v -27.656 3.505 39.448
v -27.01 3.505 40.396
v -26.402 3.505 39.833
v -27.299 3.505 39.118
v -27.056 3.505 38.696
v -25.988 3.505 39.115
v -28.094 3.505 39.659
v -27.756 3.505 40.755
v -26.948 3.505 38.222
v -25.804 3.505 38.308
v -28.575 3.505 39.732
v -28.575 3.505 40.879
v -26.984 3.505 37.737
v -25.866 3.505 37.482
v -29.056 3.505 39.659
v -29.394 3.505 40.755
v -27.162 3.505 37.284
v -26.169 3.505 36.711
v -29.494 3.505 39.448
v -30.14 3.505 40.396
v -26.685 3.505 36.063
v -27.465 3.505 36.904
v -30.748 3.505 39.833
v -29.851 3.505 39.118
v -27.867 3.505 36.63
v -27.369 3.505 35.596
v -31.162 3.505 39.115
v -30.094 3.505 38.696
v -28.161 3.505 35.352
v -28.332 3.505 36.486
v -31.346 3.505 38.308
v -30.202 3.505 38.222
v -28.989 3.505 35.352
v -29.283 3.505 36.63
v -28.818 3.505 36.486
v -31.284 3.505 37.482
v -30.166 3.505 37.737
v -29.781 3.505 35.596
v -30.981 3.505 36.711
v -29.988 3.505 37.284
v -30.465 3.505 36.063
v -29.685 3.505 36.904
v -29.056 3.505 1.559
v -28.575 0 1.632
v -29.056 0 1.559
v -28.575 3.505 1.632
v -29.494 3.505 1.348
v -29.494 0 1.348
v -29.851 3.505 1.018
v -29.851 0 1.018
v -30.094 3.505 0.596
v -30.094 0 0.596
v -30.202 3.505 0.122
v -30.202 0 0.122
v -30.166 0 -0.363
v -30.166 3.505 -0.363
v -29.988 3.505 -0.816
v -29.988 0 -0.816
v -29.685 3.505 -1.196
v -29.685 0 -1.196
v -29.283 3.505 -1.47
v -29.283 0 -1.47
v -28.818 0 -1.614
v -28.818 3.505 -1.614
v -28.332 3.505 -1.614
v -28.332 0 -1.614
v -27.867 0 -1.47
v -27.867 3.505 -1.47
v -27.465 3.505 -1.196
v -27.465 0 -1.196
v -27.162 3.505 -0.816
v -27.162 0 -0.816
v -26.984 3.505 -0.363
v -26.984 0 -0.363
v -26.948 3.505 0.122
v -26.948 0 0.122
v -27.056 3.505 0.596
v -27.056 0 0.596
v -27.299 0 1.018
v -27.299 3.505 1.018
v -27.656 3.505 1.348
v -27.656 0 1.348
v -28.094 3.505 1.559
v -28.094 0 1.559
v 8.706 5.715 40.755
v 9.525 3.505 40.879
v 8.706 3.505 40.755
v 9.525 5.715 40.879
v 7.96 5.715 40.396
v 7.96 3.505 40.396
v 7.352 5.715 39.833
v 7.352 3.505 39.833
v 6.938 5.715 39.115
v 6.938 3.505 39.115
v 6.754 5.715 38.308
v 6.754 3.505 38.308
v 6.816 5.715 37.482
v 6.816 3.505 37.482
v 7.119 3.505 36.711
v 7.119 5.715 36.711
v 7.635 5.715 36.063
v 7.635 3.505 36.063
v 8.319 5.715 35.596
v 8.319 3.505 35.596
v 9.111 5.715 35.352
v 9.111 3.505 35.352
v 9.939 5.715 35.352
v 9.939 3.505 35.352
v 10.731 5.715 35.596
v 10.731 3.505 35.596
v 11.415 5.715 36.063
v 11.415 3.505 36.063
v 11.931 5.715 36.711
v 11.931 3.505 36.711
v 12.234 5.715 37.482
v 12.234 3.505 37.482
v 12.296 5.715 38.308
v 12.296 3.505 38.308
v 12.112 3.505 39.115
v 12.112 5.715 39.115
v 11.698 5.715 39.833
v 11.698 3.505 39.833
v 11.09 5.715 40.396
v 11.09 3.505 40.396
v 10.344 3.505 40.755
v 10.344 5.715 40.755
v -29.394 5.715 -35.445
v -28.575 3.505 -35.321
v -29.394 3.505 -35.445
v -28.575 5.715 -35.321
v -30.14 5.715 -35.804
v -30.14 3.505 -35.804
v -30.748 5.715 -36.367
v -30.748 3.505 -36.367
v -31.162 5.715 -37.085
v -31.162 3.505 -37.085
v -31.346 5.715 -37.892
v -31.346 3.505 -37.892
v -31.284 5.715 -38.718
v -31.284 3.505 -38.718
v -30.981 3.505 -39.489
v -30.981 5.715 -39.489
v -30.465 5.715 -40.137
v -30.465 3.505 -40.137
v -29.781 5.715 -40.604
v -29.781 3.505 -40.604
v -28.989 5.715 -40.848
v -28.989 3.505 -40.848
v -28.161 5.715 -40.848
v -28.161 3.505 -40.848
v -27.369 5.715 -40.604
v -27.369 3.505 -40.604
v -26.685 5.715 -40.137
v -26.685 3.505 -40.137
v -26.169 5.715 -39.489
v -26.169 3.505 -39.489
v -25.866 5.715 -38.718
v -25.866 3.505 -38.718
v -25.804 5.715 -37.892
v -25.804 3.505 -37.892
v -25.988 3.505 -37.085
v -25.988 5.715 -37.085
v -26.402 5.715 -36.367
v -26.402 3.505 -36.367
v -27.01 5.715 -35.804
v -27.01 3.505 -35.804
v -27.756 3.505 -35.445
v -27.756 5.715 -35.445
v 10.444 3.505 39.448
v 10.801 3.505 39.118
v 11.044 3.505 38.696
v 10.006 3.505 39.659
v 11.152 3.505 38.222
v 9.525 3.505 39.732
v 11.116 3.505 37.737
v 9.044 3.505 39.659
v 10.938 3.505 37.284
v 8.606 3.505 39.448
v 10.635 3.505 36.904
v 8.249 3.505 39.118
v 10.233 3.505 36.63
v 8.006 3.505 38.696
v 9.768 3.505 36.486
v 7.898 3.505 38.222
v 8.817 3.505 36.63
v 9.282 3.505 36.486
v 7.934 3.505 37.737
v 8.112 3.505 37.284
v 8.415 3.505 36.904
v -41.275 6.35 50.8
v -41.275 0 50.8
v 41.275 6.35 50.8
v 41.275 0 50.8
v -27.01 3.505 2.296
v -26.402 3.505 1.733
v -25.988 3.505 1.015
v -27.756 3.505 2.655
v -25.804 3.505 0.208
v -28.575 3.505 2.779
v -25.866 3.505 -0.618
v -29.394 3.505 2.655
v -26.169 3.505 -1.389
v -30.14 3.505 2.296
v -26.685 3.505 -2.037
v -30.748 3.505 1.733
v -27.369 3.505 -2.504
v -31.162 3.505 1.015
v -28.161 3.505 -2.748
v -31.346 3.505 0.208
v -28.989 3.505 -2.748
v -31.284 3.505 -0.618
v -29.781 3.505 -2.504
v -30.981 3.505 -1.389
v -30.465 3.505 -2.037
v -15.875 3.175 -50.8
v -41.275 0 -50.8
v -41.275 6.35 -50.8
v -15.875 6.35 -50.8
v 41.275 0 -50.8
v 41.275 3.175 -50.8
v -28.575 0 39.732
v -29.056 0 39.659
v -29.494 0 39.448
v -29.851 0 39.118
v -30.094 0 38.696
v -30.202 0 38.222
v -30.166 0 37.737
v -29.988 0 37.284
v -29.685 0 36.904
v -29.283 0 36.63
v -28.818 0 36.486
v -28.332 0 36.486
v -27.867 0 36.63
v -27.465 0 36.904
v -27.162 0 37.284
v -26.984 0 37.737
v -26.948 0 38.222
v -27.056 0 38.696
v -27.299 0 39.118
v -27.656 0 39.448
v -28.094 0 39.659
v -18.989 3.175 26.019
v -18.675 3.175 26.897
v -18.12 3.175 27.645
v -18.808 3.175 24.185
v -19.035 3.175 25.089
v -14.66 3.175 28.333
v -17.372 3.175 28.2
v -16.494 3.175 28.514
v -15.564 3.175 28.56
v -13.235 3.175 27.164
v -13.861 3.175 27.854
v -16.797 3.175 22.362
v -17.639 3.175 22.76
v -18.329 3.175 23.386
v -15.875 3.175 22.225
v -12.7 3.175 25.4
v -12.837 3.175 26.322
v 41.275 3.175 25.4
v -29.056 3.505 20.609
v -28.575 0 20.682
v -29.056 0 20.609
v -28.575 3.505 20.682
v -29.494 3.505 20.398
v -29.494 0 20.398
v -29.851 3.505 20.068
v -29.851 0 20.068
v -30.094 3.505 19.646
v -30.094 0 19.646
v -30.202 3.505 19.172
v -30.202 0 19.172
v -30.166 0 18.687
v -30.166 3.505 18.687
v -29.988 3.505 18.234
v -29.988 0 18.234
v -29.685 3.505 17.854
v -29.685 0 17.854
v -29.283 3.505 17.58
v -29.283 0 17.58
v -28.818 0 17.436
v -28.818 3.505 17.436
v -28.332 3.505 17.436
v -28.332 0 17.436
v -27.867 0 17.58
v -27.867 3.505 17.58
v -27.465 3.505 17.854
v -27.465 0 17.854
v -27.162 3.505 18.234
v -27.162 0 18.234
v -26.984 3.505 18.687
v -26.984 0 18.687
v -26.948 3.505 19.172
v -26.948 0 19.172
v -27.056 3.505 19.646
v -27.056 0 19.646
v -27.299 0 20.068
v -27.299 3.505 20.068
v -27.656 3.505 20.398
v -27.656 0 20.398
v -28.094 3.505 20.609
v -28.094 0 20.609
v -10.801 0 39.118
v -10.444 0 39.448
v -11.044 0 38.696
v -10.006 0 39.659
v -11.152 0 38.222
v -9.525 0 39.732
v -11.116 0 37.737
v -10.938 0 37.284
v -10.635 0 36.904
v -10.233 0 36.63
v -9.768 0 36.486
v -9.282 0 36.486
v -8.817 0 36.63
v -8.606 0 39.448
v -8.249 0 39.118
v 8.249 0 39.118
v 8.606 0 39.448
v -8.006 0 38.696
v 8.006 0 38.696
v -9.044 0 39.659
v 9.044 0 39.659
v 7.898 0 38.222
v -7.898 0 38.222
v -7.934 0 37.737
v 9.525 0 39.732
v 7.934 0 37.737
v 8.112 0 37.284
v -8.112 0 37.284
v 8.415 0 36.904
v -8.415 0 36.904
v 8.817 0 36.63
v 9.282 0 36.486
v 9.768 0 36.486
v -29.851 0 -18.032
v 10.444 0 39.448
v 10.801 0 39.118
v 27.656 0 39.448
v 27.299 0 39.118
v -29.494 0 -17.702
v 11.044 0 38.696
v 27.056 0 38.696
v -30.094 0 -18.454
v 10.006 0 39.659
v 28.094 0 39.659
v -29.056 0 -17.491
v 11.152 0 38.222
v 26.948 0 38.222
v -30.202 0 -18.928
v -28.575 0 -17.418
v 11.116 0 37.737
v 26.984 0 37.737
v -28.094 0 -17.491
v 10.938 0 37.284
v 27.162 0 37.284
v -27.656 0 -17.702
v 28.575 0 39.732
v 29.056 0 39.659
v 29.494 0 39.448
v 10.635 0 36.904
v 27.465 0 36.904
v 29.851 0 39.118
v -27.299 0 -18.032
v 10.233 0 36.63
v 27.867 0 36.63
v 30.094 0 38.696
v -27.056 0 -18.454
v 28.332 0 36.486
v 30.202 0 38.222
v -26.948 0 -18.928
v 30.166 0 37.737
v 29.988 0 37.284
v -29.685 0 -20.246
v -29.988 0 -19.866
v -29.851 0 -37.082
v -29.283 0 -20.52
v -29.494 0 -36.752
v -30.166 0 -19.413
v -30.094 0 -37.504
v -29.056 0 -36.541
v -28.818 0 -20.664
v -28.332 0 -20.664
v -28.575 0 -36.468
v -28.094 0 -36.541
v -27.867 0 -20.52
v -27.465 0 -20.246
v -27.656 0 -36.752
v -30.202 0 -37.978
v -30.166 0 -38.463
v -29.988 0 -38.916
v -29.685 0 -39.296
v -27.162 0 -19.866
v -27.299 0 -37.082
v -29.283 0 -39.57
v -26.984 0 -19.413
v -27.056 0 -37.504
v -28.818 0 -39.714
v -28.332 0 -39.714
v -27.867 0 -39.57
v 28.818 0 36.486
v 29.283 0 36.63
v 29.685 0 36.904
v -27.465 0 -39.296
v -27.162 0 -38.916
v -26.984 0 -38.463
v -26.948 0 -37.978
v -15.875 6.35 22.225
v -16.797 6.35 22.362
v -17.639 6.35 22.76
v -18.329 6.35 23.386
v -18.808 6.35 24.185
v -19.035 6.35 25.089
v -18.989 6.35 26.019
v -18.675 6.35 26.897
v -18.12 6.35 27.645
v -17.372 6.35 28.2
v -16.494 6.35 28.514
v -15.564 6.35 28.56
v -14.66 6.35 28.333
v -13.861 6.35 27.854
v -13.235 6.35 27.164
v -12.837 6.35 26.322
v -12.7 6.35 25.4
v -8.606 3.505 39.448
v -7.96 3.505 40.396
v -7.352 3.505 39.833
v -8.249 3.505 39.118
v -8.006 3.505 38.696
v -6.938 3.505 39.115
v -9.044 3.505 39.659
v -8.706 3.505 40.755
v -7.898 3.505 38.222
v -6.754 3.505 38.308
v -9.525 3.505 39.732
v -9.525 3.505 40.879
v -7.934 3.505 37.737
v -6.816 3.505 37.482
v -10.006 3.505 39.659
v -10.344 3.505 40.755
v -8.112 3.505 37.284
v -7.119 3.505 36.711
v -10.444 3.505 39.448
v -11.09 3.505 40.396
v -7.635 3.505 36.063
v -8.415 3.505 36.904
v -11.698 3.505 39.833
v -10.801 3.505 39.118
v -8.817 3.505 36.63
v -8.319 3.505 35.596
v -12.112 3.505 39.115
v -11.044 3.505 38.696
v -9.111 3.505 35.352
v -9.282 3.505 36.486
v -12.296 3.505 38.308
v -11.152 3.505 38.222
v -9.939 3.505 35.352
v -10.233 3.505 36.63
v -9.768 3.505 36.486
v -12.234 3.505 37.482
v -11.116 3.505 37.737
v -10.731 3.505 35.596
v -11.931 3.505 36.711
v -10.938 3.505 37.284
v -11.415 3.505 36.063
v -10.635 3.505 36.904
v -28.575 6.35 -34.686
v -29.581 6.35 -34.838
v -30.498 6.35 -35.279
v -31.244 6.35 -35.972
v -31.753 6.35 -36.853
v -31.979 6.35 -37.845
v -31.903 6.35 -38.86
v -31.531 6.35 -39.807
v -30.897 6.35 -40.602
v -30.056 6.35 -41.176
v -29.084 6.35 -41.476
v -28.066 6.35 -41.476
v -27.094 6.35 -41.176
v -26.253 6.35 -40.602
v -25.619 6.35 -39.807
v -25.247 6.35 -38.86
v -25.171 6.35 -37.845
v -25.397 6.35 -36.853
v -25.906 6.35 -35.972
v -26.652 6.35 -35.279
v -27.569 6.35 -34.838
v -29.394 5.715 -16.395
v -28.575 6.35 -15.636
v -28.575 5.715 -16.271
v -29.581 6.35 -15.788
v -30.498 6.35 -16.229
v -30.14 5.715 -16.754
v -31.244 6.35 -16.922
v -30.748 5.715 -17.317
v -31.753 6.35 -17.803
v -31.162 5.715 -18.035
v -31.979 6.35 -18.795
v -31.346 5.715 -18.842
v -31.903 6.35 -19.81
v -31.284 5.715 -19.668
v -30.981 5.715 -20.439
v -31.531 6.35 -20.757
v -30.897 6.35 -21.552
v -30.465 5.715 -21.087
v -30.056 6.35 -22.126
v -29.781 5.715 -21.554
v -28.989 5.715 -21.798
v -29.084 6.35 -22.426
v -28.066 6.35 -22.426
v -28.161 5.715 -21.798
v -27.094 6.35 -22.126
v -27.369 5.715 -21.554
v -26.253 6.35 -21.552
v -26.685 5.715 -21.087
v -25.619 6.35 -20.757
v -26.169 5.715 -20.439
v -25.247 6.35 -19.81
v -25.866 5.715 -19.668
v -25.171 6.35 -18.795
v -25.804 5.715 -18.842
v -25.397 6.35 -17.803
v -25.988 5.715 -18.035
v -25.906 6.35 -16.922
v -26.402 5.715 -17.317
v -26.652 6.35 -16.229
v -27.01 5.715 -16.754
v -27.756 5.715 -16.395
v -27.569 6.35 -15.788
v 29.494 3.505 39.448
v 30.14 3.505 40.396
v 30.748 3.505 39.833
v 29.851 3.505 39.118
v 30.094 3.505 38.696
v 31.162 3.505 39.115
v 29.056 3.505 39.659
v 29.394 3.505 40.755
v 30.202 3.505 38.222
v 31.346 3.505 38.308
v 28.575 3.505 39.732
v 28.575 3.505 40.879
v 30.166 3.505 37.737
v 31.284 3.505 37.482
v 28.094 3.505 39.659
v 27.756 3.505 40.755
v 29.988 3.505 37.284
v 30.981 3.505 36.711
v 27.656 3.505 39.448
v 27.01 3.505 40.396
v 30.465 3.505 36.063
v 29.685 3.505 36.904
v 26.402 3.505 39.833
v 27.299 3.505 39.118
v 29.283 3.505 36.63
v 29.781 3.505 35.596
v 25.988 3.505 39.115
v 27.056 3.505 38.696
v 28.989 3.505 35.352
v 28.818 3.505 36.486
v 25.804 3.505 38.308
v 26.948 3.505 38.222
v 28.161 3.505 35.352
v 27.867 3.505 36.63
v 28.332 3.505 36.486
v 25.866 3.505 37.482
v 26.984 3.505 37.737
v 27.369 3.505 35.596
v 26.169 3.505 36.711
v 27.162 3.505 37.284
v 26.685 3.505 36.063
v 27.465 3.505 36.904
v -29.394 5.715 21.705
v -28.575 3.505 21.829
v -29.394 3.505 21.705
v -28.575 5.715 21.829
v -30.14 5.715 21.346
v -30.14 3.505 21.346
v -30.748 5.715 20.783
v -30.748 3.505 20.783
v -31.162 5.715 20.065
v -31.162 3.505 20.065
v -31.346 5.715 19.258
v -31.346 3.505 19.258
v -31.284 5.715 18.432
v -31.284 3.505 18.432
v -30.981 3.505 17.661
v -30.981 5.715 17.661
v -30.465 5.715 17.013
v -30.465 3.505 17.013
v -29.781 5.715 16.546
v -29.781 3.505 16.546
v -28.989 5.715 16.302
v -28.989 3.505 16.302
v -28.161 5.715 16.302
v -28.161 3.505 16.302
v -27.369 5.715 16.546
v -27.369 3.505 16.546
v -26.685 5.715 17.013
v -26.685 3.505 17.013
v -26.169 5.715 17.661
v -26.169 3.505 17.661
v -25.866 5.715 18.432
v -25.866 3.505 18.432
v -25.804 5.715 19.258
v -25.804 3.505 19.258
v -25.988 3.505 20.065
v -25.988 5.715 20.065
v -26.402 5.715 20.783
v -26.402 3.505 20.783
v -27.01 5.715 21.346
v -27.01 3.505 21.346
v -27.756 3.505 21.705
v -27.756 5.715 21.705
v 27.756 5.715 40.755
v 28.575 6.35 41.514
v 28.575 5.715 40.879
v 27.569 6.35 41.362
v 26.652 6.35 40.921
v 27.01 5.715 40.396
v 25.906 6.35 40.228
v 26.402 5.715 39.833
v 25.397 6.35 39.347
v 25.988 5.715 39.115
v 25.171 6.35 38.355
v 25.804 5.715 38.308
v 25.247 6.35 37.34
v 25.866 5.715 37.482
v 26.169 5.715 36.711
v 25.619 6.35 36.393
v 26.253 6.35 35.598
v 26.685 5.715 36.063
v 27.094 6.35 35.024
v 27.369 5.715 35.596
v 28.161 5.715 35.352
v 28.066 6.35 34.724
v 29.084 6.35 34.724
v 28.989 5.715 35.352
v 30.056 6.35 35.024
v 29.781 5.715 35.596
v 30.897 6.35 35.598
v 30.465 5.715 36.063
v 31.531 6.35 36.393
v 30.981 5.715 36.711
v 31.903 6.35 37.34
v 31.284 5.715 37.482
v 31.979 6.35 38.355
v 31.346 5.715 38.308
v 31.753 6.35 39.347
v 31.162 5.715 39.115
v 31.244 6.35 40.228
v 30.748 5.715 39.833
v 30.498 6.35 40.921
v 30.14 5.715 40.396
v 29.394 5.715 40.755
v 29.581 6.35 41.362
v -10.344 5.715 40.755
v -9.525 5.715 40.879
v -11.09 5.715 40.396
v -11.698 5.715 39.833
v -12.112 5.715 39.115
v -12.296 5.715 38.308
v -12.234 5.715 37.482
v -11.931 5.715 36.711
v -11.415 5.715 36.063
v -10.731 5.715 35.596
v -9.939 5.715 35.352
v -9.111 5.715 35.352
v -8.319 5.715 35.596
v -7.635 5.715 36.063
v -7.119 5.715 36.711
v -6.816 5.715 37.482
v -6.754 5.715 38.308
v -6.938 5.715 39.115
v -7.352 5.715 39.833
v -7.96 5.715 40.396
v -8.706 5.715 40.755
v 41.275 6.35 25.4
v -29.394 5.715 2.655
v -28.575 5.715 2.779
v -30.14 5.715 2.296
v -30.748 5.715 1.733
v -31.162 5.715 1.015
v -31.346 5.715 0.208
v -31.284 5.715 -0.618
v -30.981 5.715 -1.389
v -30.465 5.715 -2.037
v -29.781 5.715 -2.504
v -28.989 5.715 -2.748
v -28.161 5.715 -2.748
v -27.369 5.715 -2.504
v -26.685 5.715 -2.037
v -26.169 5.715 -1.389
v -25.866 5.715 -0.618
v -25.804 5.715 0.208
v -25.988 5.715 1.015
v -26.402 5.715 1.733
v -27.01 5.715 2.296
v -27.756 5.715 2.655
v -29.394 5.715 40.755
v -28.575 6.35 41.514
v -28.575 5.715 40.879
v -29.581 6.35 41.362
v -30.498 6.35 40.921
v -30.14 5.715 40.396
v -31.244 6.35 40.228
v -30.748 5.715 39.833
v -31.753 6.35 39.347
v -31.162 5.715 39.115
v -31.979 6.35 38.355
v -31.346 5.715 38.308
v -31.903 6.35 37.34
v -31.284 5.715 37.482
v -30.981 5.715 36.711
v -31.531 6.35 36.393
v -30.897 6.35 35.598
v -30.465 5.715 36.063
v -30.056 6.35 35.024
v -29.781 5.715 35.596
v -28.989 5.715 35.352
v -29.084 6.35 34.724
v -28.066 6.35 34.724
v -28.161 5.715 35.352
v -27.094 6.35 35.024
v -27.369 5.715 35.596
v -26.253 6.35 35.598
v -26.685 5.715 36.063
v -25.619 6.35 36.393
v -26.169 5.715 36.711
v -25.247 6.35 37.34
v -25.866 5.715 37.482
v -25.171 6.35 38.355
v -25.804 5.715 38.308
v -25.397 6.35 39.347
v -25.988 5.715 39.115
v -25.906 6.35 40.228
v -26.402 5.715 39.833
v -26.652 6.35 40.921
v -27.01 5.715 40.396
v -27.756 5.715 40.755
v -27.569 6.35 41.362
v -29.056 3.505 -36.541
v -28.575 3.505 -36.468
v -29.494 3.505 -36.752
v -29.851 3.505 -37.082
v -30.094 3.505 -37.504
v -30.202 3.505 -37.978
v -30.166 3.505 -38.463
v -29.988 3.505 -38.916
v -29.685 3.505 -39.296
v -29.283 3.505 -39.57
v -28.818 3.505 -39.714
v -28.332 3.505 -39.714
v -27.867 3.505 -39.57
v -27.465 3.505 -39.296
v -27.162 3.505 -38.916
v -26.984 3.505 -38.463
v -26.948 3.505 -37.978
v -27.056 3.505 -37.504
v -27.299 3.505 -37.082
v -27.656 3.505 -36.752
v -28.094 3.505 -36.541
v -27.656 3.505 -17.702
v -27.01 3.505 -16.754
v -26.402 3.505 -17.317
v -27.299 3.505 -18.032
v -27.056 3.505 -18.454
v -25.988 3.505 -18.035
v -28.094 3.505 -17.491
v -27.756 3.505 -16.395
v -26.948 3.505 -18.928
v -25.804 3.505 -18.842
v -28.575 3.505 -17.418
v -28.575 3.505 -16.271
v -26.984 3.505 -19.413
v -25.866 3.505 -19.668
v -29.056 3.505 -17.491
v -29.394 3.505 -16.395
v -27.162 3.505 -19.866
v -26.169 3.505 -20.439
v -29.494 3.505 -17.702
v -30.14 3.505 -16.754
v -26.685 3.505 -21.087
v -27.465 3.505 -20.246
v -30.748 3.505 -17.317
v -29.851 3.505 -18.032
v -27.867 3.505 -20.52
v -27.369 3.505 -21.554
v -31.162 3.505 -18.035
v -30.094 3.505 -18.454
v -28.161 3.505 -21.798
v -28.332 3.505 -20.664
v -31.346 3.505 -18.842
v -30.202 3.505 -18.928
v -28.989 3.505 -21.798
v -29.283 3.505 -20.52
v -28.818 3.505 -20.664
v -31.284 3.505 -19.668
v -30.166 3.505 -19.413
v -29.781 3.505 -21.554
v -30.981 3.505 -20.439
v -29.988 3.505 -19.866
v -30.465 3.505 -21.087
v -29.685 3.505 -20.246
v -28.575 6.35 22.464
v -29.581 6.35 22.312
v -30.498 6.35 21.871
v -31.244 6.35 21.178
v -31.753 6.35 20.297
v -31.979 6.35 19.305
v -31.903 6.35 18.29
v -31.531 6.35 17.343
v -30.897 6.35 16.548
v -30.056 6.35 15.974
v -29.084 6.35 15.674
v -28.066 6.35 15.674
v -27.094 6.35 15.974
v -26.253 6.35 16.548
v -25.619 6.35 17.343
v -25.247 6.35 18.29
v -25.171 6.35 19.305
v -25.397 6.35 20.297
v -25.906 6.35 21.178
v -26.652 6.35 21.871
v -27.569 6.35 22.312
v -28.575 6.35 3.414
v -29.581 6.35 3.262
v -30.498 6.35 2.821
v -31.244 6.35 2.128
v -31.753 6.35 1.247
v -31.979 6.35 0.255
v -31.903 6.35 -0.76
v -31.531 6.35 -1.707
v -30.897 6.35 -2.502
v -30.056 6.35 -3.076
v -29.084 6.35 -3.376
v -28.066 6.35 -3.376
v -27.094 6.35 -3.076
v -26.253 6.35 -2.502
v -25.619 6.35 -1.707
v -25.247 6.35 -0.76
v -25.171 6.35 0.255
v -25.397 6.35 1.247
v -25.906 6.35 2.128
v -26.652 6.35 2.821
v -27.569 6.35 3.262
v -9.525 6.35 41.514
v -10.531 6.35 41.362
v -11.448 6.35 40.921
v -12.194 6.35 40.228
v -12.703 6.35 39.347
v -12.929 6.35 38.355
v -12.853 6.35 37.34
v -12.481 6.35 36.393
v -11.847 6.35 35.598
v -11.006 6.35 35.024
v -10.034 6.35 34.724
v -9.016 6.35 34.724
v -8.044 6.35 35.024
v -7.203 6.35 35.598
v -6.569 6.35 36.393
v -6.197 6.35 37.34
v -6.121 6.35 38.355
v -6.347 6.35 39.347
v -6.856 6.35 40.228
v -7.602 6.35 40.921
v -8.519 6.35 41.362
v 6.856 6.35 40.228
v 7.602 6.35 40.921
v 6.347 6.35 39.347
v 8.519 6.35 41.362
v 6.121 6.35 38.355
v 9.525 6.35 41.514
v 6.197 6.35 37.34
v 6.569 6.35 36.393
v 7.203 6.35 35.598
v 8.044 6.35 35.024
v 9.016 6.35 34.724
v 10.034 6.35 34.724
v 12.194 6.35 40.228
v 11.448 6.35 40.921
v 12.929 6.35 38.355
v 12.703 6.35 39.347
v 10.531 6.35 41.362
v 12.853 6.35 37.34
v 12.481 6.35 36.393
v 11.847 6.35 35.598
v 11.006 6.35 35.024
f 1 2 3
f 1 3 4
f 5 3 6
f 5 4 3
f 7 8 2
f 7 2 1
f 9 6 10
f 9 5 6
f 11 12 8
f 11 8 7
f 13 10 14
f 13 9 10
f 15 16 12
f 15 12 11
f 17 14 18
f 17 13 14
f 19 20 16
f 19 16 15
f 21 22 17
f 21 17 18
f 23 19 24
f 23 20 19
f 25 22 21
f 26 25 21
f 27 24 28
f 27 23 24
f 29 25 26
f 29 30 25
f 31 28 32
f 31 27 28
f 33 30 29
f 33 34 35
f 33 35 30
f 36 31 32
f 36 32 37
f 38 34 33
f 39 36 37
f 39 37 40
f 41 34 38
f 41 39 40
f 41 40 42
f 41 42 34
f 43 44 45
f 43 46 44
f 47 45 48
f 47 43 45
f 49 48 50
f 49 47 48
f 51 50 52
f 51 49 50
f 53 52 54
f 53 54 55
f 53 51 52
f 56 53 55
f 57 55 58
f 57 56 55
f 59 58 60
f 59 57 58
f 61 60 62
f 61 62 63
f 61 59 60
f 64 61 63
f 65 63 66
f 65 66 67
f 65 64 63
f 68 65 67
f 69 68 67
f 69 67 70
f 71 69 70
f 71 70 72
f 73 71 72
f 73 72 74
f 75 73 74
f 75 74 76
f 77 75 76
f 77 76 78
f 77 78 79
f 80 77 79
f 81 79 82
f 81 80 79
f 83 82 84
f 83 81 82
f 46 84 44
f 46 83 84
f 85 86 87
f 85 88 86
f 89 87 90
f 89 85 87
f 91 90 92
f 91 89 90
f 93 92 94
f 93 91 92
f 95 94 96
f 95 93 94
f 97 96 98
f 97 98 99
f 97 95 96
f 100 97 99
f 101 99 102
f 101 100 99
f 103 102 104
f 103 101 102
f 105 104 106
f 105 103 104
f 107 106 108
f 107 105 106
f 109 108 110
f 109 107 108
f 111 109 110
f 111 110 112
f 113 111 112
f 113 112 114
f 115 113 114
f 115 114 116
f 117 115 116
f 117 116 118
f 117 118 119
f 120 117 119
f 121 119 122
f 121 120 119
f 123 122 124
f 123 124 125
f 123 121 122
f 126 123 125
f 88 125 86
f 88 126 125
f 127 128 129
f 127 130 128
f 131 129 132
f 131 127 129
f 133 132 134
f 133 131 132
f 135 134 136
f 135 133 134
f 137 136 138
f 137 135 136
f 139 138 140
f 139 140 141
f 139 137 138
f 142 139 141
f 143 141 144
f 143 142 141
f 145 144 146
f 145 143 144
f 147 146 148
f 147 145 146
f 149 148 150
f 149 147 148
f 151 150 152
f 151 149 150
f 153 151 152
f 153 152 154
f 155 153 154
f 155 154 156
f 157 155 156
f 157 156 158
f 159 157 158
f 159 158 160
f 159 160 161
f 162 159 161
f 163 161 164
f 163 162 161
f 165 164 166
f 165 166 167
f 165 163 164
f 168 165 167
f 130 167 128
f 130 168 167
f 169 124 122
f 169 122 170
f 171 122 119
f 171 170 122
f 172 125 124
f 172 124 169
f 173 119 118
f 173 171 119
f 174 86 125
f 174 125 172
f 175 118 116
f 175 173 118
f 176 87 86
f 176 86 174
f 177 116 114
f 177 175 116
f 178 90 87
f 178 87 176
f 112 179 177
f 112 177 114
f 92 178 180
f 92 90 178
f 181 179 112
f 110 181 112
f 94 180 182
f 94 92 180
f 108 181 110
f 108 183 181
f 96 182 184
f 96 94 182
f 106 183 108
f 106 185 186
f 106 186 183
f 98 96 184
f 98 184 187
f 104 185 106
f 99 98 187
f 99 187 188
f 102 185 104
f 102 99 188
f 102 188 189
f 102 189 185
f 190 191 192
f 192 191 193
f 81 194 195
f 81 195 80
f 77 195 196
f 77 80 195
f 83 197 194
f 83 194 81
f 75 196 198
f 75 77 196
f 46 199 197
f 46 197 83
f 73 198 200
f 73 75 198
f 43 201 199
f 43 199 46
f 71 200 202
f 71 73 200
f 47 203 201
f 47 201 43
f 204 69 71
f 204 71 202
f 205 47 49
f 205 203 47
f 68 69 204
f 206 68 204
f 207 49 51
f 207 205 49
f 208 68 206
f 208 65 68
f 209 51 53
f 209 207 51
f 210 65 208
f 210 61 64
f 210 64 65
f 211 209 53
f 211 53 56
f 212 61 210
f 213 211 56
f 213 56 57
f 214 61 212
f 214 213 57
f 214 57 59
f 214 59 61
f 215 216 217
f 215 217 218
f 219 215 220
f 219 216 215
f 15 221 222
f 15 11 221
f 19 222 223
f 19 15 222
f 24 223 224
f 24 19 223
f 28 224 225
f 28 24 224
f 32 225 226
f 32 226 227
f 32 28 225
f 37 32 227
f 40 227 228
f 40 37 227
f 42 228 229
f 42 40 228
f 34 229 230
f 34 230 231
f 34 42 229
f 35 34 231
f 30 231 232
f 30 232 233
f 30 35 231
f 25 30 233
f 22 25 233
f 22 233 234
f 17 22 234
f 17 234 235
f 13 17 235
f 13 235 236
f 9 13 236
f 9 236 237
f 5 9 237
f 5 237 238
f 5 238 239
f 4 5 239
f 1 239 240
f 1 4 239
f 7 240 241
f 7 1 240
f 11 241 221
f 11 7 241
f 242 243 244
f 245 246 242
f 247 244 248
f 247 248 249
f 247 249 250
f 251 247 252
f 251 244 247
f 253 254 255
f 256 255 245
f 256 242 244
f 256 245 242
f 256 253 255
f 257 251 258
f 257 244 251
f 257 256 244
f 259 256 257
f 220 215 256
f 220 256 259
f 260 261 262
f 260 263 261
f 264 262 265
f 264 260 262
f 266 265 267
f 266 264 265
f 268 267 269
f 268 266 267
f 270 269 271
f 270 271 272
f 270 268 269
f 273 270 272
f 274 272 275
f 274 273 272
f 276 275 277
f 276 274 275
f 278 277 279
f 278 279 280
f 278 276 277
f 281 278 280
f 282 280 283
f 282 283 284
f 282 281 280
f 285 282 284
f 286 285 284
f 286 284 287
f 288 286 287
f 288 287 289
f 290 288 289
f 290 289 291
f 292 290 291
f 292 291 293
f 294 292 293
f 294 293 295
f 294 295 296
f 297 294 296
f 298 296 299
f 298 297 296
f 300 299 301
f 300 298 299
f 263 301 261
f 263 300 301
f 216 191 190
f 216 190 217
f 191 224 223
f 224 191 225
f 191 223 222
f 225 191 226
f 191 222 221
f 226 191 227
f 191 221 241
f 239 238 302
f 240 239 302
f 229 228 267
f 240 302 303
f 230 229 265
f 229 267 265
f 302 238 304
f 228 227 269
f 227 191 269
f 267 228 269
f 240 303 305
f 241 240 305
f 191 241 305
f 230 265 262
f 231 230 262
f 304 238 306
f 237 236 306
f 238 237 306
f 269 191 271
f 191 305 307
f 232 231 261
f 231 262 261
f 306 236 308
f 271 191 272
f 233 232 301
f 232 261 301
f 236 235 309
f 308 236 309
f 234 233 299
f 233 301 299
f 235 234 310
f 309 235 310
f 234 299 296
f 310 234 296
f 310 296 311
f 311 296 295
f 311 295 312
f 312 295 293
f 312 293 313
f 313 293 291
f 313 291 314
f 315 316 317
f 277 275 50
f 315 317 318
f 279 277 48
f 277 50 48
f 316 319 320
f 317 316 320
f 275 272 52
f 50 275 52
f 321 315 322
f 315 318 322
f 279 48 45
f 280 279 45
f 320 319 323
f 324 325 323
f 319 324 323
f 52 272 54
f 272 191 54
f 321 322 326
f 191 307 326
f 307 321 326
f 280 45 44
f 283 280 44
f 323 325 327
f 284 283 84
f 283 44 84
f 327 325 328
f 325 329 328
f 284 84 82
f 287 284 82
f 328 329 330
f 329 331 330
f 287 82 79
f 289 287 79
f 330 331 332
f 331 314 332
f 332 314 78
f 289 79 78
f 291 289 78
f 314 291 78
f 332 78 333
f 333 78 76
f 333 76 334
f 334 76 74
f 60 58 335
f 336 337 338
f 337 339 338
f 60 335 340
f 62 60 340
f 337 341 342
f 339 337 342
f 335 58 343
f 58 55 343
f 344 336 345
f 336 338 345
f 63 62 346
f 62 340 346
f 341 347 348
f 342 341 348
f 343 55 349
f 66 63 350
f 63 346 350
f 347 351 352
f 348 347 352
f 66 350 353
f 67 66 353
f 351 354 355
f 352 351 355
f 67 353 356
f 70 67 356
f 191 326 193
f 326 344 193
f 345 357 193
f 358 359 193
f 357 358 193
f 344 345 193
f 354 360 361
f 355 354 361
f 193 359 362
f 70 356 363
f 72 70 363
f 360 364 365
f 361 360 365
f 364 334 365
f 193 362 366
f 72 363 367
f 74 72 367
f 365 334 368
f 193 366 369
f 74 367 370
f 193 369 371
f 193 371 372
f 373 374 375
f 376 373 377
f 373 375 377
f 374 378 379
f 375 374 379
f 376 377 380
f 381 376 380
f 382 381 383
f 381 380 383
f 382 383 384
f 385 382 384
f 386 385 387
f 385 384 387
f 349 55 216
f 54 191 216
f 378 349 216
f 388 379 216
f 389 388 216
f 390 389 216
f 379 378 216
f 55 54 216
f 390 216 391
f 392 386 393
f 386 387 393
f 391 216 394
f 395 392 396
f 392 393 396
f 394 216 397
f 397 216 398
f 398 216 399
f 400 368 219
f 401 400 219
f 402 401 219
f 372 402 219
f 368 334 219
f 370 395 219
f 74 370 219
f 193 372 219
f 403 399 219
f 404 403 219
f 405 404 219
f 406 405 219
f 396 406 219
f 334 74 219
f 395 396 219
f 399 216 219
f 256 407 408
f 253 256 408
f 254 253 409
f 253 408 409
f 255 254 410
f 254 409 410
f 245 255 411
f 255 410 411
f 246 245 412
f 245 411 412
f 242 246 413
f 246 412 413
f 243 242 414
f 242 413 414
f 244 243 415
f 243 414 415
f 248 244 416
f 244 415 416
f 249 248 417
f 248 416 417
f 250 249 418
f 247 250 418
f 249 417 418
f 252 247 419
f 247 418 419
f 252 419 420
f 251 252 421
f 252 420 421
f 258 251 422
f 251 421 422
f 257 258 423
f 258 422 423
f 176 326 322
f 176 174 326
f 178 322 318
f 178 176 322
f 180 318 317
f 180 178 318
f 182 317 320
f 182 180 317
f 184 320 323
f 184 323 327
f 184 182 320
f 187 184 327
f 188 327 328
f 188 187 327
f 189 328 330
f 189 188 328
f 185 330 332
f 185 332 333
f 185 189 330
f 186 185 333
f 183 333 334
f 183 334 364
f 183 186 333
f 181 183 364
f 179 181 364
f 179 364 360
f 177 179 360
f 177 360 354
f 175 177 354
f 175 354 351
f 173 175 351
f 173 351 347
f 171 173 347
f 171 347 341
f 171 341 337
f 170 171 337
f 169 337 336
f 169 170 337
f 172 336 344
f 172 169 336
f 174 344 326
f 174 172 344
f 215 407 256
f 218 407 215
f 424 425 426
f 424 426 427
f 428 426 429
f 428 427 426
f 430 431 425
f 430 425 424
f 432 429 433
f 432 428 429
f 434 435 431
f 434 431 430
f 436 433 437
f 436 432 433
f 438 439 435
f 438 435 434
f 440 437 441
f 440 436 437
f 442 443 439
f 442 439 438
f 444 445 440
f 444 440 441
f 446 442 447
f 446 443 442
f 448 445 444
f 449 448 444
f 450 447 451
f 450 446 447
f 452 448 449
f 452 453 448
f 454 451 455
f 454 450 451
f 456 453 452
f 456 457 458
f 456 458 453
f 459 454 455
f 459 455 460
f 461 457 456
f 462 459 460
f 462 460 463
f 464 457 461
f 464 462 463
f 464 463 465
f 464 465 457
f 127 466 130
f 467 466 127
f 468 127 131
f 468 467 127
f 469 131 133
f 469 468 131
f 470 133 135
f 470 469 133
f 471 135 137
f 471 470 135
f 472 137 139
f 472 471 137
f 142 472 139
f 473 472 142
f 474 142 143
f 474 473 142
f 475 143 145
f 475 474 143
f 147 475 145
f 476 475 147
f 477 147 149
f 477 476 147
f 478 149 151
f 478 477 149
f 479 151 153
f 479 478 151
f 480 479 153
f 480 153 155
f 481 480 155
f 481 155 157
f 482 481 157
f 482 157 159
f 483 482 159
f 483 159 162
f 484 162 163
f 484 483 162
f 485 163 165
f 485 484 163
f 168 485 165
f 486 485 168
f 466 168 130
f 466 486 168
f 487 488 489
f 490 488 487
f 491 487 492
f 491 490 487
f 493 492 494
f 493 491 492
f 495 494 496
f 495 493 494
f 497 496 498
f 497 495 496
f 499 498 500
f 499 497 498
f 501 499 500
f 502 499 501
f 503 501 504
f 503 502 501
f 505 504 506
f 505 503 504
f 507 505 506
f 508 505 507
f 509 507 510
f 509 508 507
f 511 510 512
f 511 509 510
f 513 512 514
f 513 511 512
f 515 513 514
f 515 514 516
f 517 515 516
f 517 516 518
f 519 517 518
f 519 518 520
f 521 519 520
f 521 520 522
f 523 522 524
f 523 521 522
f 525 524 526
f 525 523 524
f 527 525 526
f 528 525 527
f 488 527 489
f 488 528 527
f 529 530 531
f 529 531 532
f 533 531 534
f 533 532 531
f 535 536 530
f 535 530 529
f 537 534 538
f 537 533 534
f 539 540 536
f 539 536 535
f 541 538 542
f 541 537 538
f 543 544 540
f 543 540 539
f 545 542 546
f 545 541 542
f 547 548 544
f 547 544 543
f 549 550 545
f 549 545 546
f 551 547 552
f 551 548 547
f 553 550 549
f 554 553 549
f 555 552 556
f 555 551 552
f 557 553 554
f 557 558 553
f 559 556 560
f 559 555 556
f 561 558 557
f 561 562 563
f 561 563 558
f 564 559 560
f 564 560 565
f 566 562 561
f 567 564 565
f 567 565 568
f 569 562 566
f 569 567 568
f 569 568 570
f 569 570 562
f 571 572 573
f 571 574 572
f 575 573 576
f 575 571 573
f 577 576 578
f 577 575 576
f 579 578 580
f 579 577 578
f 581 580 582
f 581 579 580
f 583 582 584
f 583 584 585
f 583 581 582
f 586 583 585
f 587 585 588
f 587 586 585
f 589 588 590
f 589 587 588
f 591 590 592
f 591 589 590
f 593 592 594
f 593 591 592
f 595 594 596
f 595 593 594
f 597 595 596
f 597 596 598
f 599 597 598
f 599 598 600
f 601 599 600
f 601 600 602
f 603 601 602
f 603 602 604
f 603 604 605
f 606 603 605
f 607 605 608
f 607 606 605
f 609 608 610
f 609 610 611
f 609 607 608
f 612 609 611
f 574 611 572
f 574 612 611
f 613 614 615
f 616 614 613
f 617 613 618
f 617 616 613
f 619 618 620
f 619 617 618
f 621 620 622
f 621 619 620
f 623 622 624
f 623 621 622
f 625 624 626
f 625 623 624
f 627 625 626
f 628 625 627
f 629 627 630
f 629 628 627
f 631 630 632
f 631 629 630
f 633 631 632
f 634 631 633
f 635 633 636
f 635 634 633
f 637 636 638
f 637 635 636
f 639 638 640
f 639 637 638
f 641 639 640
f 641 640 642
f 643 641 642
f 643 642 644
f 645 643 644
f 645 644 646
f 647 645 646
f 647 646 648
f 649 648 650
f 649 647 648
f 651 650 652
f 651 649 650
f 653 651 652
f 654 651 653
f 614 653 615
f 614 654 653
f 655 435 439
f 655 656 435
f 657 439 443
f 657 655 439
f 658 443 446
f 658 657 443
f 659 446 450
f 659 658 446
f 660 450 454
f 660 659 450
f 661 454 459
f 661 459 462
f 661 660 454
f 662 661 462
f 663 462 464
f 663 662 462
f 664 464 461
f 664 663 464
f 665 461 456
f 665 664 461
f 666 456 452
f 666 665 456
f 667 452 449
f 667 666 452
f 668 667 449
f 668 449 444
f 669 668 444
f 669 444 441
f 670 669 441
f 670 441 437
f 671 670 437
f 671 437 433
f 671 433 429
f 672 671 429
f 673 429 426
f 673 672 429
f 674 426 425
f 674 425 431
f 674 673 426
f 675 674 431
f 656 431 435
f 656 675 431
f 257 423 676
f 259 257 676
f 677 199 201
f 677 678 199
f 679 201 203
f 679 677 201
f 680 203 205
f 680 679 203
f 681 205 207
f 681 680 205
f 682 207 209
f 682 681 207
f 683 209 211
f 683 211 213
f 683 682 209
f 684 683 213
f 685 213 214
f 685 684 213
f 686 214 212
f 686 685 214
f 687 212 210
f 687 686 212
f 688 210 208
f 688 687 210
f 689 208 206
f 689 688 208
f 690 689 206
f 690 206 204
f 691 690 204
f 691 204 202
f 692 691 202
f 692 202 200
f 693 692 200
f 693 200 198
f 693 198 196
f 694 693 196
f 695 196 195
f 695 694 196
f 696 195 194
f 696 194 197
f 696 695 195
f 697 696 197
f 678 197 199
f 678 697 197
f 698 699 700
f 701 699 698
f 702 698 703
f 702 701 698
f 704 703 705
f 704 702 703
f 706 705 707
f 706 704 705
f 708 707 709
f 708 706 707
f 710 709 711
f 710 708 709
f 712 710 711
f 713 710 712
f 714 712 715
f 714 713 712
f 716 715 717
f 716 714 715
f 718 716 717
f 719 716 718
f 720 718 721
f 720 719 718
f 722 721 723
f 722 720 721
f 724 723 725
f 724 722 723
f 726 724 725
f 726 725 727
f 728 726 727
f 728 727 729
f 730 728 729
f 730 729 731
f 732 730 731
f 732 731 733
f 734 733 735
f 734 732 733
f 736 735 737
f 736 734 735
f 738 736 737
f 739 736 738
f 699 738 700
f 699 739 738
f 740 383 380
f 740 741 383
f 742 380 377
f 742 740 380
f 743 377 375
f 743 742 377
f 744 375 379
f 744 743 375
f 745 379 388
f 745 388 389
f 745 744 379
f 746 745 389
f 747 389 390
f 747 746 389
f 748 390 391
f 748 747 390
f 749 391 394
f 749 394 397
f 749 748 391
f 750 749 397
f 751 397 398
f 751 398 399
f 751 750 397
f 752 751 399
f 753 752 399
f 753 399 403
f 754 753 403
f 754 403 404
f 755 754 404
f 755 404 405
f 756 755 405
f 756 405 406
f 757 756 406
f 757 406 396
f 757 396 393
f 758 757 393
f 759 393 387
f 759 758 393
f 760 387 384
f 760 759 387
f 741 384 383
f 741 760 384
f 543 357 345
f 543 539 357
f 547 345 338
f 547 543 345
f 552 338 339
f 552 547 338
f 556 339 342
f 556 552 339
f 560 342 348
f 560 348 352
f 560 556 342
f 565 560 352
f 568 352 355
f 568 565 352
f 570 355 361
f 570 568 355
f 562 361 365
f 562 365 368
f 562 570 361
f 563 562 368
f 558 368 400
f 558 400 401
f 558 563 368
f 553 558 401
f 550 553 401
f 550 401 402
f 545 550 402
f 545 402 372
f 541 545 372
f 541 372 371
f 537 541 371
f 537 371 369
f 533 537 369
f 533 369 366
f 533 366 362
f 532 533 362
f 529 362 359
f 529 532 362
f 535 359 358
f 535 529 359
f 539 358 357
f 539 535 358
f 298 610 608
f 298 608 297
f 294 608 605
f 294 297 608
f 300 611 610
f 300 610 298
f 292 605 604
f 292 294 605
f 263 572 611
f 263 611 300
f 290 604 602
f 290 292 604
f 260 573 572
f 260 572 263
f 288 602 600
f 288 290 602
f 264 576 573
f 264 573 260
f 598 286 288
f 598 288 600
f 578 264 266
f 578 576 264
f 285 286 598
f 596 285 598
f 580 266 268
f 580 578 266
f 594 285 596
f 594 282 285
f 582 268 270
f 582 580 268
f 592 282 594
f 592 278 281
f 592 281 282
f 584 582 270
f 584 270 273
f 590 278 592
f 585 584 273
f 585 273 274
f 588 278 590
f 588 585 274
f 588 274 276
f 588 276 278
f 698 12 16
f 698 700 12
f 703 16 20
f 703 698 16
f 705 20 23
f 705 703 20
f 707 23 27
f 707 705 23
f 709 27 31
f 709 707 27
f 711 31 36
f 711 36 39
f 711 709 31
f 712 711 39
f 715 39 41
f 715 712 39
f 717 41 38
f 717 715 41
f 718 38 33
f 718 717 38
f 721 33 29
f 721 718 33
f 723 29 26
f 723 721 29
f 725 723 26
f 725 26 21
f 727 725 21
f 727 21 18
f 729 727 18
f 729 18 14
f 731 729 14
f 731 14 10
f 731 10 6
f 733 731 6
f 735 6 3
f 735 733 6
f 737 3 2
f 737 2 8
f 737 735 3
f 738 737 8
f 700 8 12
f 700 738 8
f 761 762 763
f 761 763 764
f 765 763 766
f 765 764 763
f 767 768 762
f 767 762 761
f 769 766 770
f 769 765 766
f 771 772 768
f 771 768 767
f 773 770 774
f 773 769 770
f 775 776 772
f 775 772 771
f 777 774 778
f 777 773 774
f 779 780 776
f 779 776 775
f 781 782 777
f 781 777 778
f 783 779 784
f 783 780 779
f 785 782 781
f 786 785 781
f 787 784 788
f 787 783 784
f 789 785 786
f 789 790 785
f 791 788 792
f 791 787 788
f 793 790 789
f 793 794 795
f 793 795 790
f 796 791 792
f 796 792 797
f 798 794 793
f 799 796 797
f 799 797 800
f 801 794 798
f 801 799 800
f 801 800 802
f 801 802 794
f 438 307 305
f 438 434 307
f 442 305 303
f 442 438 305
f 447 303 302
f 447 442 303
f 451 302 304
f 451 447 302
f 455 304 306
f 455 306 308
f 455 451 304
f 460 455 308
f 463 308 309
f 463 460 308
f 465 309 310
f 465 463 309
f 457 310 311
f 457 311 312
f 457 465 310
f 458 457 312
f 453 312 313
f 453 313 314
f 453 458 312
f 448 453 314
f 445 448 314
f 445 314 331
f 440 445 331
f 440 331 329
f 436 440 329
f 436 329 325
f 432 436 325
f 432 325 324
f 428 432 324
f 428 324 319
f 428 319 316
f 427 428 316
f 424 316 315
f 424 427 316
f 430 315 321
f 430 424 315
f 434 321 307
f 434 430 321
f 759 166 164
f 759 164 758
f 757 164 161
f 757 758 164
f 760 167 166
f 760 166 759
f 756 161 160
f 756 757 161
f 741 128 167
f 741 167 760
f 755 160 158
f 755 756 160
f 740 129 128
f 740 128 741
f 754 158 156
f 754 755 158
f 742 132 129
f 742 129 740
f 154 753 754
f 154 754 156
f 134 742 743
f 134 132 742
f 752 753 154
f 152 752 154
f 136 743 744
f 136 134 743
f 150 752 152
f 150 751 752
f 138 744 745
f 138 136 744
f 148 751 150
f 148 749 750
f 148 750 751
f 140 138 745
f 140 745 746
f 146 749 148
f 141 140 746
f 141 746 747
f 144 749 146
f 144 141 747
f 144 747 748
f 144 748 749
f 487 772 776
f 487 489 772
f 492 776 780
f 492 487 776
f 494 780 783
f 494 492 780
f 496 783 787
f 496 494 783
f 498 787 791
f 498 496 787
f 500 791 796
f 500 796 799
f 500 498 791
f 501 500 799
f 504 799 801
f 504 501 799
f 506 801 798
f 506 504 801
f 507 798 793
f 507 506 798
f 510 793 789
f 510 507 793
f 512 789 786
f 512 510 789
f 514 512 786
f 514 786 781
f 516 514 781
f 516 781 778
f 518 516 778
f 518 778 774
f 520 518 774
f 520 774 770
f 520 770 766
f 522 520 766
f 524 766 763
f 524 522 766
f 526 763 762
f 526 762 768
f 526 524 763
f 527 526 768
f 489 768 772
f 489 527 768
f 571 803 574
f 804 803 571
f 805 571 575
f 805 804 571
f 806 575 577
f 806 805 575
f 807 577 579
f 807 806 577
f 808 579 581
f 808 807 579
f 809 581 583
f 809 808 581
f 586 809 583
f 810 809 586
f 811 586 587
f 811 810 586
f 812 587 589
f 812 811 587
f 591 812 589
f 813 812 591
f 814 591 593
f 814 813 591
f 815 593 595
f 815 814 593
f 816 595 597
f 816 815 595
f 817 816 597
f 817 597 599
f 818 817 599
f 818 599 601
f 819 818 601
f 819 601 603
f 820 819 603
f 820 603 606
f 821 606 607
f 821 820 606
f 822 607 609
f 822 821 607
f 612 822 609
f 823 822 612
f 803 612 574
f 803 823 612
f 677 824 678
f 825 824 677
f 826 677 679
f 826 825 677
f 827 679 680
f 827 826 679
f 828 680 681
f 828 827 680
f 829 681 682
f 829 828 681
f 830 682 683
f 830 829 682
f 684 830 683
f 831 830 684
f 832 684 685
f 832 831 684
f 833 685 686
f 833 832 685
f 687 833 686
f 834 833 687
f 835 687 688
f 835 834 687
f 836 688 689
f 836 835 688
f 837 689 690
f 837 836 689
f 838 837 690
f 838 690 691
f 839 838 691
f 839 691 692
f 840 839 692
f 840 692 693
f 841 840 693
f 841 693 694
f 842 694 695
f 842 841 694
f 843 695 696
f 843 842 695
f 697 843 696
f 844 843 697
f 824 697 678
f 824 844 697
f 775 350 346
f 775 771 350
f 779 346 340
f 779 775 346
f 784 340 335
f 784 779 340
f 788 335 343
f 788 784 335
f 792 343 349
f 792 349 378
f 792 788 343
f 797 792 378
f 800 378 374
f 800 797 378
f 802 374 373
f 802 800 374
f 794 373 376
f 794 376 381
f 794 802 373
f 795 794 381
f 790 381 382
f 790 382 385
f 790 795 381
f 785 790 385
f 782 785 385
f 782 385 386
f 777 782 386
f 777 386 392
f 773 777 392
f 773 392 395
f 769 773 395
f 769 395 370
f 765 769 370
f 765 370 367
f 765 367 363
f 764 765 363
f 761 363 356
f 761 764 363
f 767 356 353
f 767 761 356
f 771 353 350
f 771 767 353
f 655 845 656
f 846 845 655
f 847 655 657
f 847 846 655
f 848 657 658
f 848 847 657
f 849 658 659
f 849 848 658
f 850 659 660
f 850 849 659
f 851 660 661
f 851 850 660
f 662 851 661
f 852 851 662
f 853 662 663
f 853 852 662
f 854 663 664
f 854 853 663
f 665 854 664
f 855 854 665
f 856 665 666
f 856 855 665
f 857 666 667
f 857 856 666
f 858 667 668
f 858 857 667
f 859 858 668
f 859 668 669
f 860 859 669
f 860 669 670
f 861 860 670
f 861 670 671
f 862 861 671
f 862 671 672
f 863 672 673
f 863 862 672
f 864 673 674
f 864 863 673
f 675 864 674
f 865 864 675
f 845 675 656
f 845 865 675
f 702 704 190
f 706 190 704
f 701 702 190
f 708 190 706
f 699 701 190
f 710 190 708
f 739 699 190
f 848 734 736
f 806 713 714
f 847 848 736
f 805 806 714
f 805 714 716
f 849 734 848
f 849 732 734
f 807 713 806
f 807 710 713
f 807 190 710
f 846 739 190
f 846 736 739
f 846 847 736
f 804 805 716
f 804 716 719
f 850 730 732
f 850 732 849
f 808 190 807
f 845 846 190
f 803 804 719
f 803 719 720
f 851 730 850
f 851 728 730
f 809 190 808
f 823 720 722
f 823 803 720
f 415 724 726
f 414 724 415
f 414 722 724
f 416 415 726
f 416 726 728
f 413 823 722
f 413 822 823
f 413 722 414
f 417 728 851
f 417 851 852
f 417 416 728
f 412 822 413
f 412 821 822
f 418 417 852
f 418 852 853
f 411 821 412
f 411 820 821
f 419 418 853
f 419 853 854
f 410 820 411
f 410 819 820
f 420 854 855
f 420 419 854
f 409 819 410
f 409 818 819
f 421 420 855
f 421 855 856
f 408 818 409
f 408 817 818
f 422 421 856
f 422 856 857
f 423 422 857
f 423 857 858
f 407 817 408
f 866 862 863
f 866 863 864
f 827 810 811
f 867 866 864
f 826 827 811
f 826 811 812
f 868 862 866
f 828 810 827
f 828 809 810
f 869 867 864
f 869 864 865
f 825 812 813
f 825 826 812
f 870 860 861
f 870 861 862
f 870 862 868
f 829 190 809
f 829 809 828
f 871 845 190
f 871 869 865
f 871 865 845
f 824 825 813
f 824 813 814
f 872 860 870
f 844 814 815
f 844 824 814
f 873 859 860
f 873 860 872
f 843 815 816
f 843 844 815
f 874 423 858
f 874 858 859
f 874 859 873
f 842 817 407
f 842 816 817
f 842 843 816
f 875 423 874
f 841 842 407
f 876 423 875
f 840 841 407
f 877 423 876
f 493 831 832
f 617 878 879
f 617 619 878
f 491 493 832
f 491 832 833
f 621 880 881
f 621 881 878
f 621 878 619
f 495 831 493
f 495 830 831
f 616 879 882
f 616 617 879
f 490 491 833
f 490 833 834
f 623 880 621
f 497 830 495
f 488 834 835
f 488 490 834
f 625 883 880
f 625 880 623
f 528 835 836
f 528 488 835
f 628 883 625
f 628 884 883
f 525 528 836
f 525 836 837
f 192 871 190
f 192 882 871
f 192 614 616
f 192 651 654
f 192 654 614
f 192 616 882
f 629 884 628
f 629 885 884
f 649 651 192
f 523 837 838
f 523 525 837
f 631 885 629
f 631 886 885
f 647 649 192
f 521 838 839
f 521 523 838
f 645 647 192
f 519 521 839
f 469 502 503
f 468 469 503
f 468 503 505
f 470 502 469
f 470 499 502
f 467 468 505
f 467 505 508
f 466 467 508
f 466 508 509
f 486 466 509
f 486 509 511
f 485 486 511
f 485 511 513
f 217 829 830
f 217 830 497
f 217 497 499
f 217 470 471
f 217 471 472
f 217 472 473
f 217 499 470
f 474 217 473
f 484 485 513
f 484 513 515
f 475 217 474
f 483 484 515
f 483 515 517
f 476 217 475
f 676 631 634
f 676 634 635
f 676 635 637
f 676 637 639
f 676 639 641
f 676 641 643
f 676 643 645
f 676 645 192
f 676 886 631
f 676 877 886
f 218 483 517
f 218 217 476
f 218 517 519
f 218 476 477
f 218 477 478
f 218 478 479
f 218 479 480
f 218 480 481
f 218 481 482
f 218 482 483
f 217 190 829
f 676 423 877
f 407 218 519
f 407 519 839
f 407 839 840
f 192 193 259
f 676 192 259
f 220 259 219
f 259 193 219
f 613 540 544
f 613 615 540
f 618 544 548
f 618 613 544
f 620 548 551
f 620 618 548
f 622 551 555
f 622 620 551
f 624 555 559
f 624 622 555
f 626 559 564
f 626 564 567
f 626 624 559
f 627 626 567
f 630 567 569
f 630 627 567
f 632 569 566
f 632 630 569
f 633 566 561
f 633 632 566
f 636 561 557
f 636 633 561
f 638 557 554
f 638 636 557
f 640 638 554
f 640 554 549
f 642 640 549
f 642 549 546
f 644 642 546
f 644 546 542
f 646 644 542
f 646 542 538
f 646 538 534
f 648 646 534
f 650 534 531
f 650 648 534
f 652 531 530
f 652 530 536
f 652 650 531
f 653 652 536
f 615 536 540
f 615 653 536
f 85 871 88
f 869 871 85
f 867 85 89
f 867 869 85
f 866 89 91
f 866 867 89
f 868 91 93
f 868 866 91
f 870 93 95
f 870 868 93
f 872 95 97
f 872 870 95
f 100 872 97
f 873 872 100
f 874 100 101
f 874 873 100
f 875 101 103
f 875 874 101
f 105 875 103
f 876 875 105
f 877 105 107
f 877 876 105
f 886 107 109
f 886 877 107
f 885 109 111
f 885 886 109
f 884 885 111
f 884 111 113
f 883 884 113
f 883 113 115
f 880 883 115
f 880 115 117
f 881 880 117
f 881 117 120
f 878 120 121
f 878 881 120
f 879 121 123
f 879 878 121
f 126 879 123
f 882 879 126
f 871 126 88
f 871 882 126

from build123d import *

# Parameters (mm, degrees)
BASE_PLATE_W                    = 82.55
BASE_PLATE_H                    = 101.6
MAIN_BODY_DEPTH                 = 6.35
MOUNTING_HOLES_CBORE_AT_2_COUNT = 2
MOUNTING_HOLES_CBORE_AT_2_PITCH = 19.05
MOUNTING_HOLES_CBORE_AT_3_COUNT = 2
MOUNTING_HOLES_CBORE_AT_3_PITCH = 38.1
MOUNTING_HOLES_CBORE_AT_4_COUNT = 2
MOUNTING_HOLES_CBORE_AT_4_PITCH = 57.15
MOUNTING_HOLES_CBORE_AT_5_COUNT = 2
MOUNTING_HOLES_CBORE_AT_5_PITCH = 19.05
MOUNTING_HOLES_CBORE_AT_6_COUNT = 2
MOUNTING_HOLES_CBORE_AT_6_PITCH = 38.1
MOUNTING_HOLES_CBORE_AT_7_COUNT = 2
MOUNTING_HOLES_CBORE_AT_7_PITCH = 57.15
MOUNTING_HOLES_CBORE_AT_8_COUNT = 2
MOUNTING_HOLES_CBORE_AT_8_PITCH = 76.2
L_AREA_EXCLUSION_W              = 57.15
L_AREA_EXCLUSION_H              = 76.2
L_AREA_STEP_CUT_DEPTH           = 3.175
RELIEF_CIRCLE_SKETCH_R          = 3.175
SUBSTRATE_RELIEF_POCKET_DEPTH   = 3.175


with BuildPart() as part:
    # Base Plate → Main Body (new body)
    with BuildSketch(Plane(origin=(0, 0, 0), x_dir=(1, 0, 0), z_dir=(0, 1, 0))):
        Rectangle(BASE_PLATE_W, BASE_PLATE_H)
    extrude(amount=MAIN_BODY_DEPTH)

    # Hole Profile → Mounting Holes _CBORE (revolve, cut)
    with BuildSketch(Plane(origin=(-28.575, 6.35, 38.1), x_dir=(0, 0, 1), z_dir=(1, 0, 0))):
        Polygon((0, 0), (0, 6.35), (1.63195, 6.35), (1.63195, 2.8448), (2.77876, 2.8448), (2.77876, 0.635), (3.41376, 0), align=None)
    mounting_holes_cbore = revolve(axis=Axis((-28.575, 12.7, 38.1), (0, -1, 0)), mode=Mode.SUBTRACT)

    # Mounting Holes _CBORE at 2: Mounting Holes _CBORE ×2
    with Locations(*[(i * MOUNTING_HOLES_CBORE_AT_2_PITCH, 0, 0) for i in range(1, MOUNTING_HOLES_CBORE_AT_2_COUNT)]):
        add(mounting_holes_cbore, mode=Mode.SUBTRACT)

    # Mounting Holes _CBORE at 3: Mounting Holes _CBORE ×2
    with Locations(*[(i * MOUNTING_HOLES_CBORE_AT_3_PITCH, 0, 0) for i in range(1, MOUNTING_HOLES_CBORE_AT_3_COUNT)]):
        add(mounting_holes_cbore, mode=Mode.SUBTRACT)

    # Mounting Holes _CBORE at 4: Mounting Holes _CBORE ×2
    with Locations(*[(i * MOUNTING_HOLES_CBORE_AT_4_PITCH, 0, 0) for i in range(1, MOUNTING_HOLES_CBORE_AT_4_COUNT)]):
        add(mounting_holes_cbore, mode=Mode.SUBTRACT)

    # Mounting Holes _CBORE at 5: Mounting Holes _CBORE ×2
    with Locations(*[(0, 0, -i * MOUNTING_HOLES_CBORE_AT_5_PITCH) for i in range(1, MOUNTING_HOLES_CBORE_AT_5_COUNT)]):
        add(mounting_holes_cbore, mode=Mode.SUBTRACT)

    # Mounting Holes _CBORE at 6: Mounting Holes _CBORE ×2
    with Locations(*[(0, 0, -i * MOUNTING_HOLES_CBORE_AT_6_PITCH) for i in range(1, MOUNTING_HOLES_CBORE_AT_6_COUNT)]):
        add(mounting_holes_cbore, mode=Mode.SUBTRACT)

    # Mounting Holes _CBORE at 7: Mounting Holes _CBORE ×2
    with Locations(*[(0, 0, -i * MOUNTING_HOLES_CBORE_AT_7_PITCH) for i in range(1, MOUNTING_HOLES_CBORE_AT_7_COUNT)]):
        add(mounting_holes_cbore, mode=Mode.SUBTRACT)

    # Mounting Holes _CBORE at 8: Mounting Holes _CBORE ×2
    with Locations(*[(0, 0, -i * MOUNTING_HOLES_CBORE_AT_8_PITCH) for i in range(1, MOUNTING_HOLES_CBORE_AT_8_COUNT)]):
        add(mounting_holes_cbore, mode=Mode.SUBTRACT)

    # L-Area Exclusion → L-Area Step Cut (cut)
    with BuildSketch(Plane(origin=(0, 6.35, 0), x_dir=(1, 0, 0), z_dir=(0, 1, 0))):
        with Locations((12.7, 12.7)):
            Rectangle(L_AREA_EXCLUSION_W, L_AREA_EXCLUSION_H)
    extrude(amount=-L_AREA_STEP_CUT_DEPTH, mode=Mode.SUBTRACT)

    # Relief Circle Sketch → Substrate Relief Pocket (cut)
    with BuildSketch(Plane(origin=(0, 6.35, 0), x_dir=(1, 0, 0), z_dir=(0, 1, 0))):
        with Locations((-15.875, -25.4)):
            Circle(RELIEF_CIRCLE_SKETCH_R)
    extrude(amount=-SUBSTRATE_RELIEF_POCKET_DEPTH, mode=Mode.SUBTRACT)


solid = part.part
